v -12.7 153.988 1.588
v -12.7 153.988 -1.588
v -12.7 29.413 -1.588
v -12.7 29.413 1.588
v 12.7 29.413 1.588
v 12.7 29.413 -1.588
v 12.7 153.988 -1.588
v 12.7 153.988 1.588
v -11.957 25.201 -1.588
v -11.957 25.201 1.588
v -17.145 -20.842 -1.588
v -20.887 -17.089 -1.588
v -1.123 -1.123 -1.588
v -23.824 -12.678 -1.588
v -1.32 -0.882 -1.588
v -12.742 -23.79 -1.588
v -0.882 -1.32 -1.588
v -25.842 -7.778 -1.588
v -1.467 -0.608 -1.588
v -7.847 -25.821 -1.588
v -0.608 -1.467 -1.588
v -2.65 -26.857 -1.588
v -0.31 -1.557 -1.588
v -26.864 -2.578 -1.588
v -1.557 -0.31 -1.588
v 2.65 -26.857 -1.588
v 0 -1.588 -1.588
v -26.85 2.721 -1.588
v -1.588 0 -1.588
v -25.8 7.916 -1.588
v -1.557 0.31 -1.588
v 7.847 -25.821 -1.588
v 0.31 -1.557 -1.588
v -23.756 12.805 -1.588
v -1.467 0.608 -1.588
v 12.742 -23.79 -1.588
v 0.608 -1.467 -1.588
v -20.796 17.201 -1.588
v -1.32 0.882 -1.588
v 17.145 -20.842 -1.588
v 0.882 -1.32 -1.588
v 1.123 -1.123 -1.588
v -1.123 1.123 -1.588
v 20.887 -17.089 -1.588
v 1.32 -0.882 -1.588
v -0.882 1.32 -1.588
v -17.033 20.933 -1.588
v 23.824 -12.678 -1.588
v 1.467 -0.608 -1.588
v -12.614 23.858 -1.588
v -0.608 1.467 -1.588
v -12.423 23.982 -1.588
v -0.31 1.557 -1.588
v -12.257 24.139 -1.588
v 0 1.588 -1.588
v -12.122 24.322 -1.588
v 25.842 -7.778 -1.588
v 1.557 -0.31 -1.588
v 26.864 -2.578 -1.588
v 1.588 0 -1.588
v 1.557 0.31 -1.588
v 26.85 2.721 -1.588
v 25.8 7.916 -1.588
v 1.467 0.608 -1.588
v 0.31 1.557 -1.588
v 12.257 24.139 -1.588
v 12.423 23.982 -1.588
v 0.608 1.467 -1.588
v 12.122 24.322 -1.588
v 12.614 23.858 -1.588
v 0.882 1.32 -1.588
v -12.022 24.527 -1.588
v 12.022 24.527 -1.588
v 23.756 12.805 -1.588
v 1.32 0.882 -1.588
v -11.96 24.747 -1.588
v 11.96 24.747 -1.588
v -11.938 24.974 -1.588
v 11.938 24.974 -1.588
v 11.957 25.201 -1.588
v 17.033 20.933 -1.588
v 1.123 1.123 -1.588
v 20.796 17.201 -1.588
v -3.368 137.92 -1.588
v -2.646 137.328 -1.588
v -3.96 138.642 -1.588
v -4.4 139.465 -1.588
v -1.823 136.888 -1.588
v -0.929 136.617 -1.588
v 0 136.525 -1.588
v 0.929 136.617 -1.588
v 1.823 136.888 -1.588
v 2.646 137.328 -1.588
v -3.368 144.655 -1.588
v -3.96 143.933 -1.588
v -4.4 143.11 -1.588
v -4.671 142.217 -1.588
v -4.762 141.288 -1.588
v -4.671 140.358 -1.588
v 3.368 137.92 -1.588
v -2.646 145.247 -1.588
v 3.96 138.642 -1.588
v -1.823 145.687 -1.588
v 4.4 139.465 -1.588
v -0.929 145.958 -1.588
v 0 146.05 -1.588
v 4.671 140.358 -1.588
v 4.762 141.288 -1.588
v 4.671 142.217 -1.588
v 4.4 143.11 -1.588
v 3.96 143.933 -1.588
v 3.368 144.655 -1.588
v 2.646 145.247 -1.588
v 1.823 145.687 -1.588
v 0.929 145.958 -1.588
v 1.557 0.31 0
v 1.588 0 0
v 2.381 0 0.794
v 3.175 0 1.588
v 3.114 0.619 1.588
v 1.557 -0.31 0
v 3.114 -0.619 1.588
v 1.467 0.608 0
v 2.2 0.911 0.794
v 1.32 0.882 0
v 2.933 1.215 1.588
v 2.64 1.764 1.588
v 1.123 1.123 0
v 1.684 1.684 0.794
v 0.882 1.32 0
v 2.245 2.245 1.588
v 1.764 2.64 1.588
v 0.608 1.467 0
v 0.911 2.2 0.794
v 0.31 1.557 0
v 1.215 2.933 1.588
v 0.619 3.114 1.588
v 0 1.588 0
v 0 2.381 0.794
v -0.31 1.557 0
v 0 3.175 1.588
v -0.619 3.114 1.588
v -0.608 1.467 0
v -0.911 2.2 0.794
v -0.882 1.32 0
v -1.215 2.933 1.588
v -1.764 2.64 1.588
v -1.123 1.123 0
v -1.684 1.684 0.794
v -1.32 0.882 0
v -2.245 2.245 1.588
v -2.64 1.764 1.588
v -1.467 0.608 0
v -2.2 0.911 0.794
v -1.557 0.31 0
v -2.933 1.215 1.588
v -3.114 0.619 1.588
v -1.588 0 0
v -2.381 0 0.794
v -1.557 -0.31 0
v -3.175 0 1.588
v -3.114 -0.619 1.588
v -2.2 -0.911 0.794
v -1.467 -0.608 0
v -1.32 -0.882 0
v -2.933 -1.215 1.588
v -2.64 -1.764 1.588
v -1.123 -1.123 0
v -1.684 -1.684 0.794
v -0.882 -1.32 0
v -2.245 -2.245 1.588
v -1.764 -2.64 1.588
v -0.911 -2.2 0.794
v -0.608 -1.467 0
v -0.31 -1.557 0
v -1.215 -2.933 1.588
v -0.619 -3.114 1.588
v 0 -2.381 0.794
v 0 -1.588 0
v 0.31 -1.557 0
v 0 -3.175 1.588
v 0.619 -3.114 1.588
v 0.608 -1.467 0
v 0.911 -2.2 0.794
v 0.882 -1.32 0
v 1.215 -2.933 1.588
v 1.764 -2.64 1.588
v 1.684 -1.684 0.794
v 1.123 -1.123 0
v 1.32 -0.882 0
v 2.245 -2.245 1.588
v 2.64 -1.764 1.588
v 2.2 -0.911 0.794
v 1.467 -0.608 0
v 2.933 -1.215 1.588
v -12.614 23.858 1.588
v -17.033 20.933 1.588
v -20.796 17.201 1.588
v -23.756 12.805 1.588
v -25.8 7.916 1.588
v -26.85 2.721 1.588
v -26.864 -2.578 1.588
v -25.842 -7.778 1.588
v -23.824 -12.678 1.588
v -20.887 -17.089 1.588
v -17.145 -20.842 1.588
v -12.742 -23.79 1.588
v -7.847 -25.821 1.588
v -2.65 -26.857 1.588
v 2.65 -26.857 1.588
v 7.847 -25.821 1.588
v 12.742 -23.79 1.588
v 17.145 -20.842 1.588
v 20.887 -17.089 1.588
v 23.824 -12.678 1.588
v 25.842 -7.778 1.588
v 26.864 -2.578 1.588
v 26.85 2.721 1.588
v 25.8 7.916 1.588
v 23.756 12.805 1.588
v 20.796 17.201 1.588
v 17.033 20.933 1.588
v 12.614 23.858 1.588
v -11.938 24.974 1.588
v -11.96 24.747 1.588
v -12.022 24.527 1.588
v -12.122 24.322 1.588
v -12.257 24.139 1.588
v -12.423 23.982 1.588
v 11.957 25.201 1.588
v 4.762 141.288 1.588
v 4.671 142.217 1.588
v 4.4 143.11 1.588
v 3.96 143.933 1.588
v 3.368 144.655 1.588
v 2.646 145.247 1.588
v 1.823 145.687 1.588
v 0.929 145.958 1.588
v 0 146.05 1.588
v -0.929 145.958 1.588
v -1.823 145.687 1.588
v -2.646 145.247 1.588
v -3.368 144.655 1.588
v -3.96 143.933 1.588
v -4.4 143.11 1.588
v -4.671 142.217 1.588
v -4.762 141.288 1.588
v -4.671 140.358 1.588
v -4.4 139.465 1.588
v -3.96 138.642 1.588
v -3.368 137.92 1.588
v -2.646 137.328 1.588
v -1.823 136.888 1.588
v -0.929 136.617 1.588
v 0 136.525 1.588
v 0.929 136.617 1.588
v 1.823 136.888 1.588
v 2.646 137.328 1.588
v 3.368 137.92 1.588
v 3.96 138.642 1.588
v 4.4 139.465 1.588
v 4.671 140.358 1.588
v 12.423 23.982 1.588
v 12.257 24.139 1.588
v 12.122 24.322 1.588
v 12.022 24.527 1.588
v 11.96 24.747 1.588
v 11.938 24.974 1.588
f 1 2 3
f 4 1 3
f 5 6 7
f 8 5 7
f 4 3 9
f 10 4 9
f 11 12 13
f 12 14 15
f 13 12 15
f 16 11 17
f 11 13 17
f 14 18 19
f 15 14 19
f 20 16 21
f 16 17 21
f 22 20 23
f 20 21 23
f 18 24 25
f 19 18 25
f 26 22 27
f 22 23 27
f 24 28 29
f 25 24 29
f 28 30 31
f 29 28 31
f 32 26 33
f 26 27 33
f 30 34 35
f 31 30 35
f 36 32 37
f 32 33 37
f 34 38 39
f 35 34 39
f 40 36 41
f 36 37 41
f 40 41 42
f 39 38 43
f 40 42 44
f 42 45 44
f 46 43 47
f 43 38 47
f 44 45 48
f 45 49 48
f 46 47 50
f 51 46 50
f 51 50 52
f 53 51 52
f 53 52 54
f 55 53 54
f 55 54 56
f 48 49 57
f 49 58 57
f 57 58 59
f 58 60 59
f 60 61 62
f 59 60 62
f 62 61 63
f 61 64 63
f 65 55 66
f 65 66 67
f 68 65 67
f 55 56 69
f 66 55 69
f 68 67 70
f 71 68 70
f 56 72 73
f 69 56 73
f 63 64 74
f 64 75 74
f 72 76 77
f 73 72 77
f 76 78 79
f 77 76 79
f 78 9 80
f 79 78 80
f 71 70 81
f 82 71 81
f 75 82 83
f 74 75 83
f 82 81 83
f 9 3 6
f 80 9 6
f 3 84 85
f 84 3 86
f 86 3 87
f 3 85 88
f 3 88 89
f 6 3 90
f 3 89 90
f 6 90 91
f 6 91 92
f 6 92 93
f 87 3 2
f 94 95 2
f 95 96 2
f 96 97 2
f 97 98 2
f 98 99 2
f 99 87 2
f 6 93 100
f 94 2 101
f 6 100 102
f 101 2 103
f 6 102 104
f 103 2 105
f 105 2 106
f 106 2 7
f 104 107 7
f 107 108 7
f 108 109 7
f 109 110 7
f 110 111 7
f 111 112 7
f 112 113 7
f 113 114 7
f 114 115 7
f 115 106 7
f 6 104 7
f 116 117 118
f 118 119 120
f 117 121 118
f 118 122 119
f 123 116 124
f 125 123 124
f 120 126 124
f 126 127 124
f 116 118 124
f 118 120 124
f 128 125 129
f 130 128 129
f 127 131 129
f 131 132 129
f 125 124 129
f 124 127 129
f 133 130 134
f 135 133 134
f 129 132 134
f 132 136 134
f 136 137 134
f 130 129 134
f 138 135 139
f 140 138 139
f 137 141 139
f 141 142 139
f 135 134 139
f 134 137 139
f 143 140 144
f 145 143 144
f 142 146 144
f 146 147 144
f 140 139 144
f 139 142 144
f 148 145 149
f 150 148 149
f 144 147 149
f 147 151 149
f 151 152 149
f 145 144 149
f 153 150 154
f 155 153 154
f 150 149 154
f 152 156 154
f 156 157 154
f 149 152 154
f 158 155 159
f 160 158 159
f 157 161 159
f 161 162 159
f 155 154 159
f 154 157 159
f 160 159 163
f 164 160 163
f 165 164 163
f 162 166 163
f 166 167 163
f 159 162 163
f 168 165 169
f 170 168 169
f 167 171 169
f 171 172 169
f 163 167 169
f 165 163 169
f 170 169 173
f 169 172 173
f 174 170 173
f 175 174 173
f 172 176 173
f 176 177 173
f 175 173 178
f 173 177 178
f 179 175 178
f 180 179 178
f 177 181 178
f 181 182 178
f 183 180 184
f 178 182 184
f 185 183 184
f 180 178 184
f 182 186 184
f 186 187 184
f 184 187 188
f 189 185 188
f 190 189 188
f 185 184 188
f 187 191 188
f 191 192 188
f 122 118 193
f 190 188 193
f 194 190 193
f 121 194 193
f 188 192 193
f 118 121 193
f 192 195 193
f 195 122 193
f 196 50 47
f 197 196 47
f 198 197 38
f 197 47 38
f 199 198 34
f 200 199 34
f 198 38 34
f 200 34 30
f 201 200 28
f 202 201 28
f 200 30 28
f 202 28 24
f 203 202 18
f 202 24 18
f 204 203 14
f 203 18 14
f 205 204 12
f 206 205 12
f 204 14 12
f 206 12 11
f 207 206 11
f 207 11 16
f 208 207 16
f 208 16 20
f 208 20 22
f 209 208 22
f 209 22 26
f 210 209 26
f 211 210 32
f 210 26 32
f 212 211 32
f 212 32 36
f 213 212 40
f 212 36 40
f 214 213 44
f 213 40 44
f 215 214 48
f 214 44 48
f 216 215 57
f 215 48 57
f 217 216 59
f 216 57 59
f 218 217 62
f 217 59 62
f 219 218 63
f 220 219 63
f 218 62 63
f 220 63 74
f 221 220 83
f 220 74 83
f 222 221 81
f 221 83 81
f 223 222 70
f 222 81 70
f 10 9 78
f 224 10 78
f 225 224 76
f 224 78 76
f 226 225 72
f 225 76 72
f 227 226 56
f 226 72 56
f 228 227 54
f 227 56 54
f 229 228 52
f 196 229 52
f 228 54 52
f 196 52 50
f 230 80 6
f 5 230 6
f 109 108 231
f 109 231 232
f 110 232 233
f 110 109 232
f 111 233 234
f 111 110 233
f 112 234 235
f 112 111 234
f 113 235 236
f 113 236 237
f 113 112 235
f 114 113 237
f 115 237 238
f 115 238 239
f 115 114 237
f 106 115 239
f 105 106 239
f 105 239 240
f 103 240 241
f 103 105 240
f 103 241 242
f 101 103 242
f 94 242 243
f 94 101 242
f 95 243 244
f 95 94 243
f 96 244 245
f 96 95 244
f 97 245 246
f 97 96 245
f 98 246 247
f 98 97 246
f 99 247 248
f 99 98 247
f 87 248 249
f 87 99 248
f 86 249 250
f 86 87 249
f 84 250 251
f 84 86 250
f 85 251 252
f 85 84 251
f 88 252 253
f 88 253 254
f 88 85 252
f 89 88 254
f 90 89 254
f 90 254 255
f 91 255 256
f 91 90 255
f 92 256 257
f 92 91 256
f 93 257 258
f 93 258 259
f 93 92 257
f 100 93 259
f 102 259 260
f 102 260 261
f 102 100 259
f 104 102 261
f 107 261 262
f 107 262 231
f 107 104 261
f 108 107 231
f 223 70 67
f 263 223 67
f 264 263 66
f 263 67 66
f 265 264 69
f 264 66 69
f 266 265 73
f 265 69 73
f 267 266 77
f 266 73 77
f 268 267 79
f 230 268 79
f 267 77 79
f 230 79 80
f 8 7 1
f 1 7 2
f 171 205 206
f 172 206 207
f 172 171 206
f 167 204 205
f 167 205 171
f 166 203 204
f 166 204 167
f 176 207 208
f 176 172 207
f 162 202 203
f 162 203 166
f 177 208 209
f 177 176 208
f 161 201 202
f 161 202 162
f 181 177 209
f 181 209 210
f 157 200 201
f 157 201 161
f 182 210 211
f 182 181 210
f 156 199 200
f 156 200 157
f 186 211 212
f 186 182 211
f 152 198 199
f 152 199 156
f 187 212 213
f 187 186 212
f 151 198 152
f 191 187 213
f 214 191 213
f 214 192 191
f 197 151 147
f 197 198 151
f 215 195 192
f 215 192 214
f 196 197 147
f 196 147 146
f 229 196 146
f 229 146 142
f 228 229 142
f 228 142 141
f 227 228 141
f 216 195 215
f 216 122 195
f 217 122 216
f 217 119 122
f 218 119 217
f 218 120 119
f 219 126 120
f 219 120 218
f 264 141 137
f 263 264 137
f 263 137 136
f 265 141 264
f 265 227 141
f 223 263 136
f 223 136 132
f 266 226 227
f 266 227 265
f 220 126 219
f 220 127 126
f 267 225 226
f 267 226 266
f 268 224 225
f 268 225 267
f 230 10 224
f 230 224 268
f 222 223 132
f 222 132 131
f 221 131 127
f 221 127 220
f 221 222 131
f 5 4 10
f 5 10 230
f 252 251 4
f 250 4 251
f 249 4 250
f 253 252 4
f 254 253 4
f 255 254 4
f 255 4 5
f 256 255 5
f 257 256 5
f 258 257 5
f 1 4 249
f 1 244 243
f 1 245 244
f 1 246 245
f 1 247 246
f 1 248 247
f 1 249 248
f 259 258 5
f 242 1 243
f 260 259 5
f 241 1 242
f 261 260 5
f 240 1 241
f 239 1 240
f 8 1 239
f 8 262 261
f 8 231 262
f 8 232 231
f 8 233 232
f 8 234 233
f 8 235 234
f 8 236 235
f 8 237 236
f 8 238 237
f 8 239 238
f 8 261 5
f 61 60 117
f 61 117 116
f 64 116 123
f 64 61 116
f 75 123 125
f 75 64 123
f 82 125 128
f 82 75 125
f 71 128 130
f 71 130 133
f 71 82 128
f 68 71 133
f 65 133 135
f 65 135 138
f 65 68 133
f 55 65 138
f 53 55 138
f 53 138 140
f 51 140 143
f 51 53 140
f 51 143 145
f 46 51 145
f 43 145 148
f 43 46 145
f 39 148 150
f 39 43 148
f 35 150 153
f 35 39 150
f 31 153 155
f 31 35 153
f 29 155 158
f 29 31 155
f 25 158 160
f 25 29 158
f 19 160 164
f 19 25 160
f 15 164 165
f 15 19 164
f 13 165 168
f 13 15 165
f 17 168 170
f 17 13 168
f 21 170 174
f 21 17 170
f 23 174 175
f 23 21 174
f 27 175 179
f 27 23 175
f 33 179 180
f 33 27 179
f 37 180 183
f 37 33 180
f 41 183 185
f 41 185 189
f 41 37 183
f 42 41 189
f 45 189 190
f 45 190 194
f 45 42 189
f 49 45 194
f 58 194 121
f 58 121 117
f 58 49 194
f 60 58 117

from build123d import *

# Parameters (mm, degrees)
BOSS_EXTRUDE1_DEPTH      = 1.5875
BOSS_EXTRUDE1_DEPTH_BACK = 1.5875
SKETCH3_R                = 1.5875
SKETCH3_R_2              = 4.7625
CHAMFER1_SIZE            = 1.5875


with BuildPart() as part:
    # Sketch3 → Boss-Extrude1 (new, two sides: drawn at the far end of the back side and taken through both)
    with BuildSketch(Plane.XY.offset(-BOSS_EXTRUDE1_DEPTH_BACK)):
        with BuildLine():
            Line((-12.7, 29.413320739), (-11.957294154, 25.201226576))
            ThreePointArc((-11.957294154, 25.201226576), (-12.067180073, 24.422634348), (-12.614382022, 23.857965597))
            ThreePointArc((-12.614382022, 23.857965597), (0, -26.9875), (12.614382022, 23.857965597))
            ThreePointArc((12.614382022, 23.857965597), (12.067180073, 24.422634348), (11.957294154, 25.201226576))
            Line((11.957294154, 25.201226576), (12.7, 29.413320739))
            Line((12.7, 29.413320739), (12.7, 153.9875))
            Line((12.7, 153.9875), (-12.7, 153.9875))
            Line((-12.7, 153.9875), (-12.7, 29.413320739))
        make_face()
        Circle(SKETCH3_R, mode=Mode.SUBTRACT)
        with Locations((0, 141.2875)):
            Circle(SKETCH3_R_2, mode=Mode.SUBTRACT)
    extrude(amount=BOSS_EXTRUDE1_DEPTH + BOSS_EXTRUDE1_DEPTH_BACK)

    # Chamfer1
    chamfer1_edges = [part.edges().sort_by_distance(p)[0] for p in [
        (-1.5875, 0, 1.5875),
    ]]
    chamfer(chamfer1_edges, length=CHAMFER1_SIZE)


solid = part.part
